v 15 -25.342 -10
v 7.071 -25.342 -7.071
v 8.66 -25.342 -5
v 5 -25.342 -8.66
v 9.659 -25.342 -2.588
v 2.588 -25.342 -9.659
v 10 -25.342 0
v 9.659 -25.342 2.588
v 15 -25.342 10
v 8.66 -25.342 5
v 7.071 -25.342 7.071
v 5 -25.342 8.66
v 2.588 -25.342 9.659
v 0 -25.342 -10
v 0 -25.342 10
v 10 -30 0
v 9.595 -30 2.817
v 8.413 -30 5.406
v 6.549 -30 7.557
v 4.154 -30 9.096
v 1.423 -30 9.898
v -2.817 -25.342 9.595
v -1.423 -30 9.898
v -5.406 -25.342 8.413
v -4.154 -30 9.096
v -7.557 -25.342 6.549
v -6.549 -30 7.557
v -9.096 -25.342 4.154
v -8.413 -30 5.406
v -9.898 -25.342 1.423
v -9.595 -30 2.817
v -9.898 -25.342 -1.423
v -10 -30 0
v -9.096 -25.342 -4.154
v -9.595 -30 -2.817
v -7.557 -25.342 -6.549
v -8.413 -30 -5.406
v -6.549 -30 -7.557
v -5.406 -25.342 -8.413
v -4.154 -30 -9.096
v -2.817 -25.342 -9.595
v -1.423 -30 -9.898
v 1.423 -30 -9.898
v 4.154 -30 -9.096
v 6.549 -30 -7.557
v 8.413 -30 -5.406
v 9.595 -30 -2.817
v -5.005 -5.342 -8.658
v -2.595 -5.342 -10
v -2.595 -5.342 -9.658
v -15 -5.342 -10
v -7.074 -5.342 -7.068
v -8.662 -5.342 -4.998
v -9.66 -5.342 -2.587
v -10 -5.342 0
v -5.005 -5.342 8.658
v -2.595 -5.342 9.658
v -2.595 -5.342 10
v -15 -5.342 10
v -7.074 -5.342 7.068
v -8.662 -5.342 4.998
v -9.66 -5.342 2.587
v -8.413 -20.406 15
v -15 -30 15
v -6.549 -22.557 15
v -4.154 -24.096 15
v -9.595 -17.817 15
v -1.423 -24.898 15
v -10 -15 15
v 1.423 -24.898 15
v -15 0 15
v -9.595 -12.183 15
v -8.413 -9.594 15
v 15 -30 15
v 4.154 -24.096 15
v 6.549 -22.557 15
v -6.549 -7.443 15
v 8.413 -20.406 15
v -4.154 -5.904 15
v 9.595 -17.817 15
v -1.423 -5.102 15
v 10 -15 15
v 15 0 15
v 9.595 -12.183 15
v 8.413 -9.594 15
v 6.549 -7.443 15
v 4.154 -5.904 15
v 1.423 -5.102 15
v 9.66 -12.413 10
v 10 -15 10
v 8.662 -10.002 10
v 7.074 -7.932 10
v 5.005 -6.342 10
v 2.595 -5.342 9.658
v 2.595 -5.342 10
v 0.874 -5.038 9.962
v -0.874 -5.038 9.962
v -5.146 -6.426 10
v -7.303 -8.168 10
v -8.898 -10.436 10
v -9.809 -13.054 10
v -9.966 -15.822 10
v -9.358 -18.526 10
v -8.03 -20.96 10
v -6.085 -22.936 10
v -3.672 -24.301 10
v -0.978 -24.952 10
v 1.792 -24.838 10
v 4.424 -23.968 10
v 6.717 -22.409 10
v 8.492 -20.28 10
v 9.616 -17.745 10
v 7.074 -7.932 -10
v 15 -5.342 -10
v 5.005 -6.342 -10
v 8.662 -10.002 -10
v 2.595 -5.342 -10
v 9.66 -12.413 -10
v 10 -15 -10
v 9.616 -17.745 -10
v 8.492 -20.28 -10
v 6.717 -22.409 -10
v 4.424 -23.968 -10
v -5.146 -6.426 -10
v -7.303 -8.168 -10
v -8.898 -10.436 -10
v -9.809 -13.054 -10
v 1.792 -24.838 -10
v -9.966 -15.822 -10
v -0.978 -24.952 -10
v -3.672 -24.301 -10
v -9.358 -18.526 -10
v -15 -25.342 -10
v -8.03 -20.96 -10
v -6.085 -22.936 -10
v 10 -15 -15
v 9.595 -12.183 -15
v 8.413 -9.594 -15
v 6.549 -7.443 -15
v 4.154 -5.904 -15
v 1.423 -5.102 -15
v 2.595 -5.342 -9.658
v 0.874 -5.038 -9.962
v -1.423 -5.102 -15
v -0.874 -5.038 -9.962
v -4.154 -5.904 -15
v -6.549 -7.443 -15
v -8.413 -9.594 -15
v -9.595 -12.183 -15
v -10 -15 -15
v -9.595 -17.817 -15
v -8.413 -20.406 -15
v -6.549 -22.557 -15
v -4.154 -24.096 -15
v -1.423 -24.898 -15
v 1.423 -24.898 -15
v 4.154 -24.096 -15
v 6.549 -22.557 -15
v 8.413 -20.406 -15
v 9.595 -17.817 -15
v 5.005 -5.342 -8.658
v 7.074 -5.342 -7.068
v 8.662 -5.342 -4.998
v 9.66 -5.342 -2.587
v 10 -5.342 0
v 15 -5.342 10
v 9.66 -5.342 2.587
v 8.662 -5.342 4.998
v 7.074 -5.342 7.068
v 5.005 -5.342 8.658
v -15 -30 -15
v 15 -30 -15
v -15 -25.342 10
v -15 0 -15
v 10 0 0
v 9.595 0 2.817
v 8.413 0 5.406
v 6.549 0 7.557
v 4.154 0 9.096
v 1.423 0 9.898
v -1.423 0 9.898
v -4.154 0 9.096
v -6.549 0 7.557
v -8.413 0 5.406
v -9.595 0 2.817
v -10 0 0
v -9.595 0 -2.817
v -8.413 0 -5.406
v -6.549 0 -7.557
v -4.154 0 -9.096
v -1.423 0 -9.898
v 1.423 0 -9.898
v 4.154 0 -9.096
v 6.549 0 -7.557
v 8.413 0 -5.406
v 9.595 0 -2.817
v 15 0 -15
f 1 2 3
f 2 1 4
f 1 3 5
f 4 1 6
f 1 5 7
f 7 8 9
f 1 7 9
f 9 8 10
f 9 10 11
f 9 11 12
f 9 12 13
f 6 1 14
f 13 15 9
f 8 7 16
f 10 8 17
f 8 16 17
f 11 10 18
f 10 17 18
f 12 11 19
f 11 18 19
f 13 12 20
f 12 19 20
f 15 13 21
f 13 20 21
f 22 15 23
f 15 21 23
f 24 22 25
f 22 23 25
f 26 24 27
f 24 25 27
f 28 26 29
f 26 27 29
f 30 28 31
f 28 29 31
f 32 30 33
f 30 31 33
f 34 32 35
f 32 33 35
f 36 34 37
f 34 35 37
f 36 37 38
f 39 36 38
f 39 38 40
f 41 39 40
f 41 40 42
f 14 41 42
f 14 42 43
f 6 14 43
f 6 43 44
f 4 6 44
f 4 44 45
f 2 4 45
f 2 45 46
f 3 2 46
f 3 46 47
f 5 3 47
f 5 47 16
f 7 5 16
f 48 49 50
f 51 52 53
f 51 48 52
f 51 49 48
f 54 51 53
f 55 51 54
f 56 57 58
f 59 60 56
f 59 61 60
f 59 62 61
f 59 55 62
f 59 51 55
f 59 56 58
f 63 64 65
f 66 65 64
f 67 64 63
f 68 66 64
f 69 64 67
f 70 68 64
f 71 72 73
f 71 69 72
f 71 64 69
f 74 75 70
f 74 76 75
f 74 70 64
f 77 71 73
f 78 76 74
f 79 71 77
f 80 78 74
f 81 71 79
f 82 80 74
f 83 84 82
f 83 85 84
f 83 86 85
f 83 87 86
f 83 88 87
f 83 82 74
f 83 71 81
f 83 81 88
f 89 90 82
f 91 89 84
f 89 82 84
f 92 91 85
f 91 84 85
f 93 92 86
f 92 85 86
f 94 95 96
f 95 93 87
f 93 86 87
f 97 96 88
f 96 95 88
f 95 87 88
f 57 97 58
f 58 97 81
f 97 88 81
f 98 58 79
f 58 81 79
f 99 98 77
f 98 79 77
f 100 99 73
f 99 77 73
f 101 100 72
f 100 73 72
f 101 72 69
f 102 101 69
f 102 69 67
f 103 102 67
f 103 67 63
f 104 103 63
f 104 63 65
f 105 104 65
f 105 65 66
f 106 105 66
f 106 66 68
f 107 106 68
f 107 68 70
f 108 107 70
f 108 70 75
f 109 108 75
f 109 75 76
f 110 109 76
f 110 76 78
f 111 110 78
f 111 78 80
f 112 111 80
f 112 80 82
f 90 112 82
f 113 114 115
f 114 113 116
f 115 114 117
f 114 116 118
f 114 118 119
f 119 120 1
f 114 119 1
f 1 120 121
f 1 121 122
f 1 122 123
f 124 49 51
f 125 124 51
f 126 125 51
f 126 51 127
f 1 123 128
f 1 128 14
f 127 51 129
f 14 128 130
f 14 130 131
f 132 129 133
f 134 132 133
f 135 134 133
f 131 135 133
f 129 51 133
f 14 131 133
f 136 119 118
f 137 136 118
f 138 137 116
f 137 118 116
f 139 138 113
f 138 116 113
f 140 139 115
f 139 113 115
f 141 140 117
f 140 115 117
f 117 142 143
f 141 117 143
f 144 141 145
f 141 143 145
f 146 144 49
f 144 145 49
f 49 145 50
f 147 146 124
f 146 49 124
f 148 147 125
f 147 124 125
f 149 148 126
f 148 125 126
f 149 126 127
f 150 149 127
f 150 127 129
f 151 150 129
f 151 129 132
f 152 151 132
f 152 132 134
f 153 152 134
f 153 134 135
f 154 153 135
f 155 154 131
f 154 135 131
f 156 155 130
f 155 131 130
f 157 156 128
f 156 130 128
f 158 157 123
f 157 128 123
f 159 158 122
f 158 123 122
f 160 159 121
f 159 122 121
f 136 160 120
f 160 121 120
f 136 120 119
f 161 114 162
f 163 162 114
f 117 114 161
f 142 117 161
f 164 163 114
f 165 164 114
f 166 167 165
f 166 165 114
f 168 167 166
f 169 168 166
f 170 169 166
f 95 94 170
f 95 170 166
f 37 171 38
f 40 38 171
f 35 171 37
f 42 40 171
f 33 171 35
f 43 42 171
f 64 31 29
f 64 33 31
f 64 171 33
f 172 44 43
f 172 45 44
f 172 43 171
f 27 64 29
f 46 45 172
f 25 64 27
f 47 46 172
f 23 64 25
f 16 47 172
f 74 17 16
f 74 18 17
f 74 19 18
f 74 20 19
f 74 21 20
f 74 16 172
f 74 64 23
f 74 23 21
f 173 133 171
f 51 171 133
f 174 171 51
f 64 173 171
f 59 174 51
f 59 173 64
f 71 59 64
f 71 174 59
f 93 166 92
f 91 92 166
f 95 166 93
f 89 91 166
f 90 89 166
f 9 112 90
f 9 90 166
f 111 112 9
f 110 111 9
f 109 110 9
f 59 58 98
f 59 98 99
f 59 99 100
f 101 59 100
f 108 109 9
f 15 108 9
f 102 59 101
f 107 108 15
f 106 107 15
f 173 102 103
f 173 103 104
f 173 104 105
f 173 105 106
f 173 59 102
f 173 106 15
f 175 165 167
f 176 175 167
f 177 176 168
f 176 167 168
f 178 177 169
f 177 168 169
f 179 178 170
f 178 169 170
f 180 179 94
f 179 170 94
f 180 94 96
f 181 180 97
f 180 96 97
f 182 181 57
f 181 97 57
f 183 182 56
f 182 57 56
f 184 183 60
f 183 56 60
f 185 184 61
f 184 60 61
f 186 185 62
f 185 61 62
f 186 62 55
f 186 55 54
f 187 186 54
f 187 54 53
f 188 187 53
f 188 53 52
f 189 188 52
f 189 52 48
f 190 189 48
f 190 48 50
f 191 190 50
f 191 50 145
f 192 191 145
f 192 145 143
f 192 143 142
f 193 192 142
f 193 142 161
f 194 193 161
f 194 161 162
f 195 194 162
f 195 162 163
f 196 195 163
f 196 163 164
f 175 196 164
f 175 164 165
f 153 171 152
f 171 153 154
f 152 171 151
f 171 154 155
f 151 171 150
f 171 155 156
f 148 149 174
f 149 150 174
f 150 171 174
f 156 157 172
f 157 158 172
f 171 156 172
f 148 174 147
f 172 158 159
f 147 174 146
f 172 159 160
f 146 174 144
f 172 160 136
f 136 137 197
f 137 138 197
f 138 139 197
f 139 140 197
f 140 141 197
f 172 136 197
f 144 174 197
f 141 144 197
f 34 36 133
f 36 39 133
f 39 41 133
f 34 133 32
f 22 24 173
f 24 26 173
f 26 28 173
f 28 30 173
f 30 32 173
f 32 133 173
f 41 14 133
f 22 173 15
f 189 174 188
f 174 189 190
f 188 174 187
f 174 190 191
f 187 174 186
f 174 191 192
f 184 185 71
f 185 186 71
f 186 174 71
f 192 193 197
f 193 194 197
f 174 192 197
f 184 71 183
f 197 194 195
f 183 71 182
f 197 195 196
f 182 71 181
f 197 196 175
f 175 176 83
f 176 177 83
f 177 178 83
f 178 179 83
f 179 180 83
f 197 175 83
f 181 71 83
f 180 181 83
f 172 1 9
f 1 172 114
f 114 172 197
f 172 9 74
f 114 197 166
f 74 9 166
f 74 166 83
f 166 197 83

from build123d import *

# Parameters (mm, degrees)
F0_W     = 30
F0_H     = 30
F1_DEPTH = 30
F3_R     = 10
F5_DEPTH = 30.001
F4_W     = 20
F4_H     = 20
F6_DEPTH = 30.001
F7_R     = 10
F8_DEPTH = 30.001


with BuildPart() as f1:
    # F0 (on Front) → F1 (new body)
    with BuildSketch(Plane.XZ):
        Rectangle(F0_W, F0_H)
    extrude(amount=F1_DEPTH)

    # F3 (on face) → F5 (cut, through all)
    with BuildSketch(Plane.XZ.offset(30)):
        Circle(F3_R)
    extrude(amount=-F5_DEPTH, mode=Mode.SUBTRACT)

    # F4 (on face) → F6 (cut, through all)
    with BuildSketch(Plane(origin=(-15, 0, 0), x_dir=(0, -1, 0), z_dir=(-1, 0, 0))):
        with Locations((15.342466, 0)):
            Rectangle(F4_W, F4_H)
    extrude(amount=-F6_DEPTH, mode=Mode.SUBTRACT)

    # F7 (on face) → F8 (cut, through all)
    with BuildSketch(Plane.XY.offset(15)):
        with Locations((0, -15)):
            Circle(F7_R)
    extrude(amount=-F8_DEPTH, mode=Mode.SUBTRACT)


solid = f1.part
